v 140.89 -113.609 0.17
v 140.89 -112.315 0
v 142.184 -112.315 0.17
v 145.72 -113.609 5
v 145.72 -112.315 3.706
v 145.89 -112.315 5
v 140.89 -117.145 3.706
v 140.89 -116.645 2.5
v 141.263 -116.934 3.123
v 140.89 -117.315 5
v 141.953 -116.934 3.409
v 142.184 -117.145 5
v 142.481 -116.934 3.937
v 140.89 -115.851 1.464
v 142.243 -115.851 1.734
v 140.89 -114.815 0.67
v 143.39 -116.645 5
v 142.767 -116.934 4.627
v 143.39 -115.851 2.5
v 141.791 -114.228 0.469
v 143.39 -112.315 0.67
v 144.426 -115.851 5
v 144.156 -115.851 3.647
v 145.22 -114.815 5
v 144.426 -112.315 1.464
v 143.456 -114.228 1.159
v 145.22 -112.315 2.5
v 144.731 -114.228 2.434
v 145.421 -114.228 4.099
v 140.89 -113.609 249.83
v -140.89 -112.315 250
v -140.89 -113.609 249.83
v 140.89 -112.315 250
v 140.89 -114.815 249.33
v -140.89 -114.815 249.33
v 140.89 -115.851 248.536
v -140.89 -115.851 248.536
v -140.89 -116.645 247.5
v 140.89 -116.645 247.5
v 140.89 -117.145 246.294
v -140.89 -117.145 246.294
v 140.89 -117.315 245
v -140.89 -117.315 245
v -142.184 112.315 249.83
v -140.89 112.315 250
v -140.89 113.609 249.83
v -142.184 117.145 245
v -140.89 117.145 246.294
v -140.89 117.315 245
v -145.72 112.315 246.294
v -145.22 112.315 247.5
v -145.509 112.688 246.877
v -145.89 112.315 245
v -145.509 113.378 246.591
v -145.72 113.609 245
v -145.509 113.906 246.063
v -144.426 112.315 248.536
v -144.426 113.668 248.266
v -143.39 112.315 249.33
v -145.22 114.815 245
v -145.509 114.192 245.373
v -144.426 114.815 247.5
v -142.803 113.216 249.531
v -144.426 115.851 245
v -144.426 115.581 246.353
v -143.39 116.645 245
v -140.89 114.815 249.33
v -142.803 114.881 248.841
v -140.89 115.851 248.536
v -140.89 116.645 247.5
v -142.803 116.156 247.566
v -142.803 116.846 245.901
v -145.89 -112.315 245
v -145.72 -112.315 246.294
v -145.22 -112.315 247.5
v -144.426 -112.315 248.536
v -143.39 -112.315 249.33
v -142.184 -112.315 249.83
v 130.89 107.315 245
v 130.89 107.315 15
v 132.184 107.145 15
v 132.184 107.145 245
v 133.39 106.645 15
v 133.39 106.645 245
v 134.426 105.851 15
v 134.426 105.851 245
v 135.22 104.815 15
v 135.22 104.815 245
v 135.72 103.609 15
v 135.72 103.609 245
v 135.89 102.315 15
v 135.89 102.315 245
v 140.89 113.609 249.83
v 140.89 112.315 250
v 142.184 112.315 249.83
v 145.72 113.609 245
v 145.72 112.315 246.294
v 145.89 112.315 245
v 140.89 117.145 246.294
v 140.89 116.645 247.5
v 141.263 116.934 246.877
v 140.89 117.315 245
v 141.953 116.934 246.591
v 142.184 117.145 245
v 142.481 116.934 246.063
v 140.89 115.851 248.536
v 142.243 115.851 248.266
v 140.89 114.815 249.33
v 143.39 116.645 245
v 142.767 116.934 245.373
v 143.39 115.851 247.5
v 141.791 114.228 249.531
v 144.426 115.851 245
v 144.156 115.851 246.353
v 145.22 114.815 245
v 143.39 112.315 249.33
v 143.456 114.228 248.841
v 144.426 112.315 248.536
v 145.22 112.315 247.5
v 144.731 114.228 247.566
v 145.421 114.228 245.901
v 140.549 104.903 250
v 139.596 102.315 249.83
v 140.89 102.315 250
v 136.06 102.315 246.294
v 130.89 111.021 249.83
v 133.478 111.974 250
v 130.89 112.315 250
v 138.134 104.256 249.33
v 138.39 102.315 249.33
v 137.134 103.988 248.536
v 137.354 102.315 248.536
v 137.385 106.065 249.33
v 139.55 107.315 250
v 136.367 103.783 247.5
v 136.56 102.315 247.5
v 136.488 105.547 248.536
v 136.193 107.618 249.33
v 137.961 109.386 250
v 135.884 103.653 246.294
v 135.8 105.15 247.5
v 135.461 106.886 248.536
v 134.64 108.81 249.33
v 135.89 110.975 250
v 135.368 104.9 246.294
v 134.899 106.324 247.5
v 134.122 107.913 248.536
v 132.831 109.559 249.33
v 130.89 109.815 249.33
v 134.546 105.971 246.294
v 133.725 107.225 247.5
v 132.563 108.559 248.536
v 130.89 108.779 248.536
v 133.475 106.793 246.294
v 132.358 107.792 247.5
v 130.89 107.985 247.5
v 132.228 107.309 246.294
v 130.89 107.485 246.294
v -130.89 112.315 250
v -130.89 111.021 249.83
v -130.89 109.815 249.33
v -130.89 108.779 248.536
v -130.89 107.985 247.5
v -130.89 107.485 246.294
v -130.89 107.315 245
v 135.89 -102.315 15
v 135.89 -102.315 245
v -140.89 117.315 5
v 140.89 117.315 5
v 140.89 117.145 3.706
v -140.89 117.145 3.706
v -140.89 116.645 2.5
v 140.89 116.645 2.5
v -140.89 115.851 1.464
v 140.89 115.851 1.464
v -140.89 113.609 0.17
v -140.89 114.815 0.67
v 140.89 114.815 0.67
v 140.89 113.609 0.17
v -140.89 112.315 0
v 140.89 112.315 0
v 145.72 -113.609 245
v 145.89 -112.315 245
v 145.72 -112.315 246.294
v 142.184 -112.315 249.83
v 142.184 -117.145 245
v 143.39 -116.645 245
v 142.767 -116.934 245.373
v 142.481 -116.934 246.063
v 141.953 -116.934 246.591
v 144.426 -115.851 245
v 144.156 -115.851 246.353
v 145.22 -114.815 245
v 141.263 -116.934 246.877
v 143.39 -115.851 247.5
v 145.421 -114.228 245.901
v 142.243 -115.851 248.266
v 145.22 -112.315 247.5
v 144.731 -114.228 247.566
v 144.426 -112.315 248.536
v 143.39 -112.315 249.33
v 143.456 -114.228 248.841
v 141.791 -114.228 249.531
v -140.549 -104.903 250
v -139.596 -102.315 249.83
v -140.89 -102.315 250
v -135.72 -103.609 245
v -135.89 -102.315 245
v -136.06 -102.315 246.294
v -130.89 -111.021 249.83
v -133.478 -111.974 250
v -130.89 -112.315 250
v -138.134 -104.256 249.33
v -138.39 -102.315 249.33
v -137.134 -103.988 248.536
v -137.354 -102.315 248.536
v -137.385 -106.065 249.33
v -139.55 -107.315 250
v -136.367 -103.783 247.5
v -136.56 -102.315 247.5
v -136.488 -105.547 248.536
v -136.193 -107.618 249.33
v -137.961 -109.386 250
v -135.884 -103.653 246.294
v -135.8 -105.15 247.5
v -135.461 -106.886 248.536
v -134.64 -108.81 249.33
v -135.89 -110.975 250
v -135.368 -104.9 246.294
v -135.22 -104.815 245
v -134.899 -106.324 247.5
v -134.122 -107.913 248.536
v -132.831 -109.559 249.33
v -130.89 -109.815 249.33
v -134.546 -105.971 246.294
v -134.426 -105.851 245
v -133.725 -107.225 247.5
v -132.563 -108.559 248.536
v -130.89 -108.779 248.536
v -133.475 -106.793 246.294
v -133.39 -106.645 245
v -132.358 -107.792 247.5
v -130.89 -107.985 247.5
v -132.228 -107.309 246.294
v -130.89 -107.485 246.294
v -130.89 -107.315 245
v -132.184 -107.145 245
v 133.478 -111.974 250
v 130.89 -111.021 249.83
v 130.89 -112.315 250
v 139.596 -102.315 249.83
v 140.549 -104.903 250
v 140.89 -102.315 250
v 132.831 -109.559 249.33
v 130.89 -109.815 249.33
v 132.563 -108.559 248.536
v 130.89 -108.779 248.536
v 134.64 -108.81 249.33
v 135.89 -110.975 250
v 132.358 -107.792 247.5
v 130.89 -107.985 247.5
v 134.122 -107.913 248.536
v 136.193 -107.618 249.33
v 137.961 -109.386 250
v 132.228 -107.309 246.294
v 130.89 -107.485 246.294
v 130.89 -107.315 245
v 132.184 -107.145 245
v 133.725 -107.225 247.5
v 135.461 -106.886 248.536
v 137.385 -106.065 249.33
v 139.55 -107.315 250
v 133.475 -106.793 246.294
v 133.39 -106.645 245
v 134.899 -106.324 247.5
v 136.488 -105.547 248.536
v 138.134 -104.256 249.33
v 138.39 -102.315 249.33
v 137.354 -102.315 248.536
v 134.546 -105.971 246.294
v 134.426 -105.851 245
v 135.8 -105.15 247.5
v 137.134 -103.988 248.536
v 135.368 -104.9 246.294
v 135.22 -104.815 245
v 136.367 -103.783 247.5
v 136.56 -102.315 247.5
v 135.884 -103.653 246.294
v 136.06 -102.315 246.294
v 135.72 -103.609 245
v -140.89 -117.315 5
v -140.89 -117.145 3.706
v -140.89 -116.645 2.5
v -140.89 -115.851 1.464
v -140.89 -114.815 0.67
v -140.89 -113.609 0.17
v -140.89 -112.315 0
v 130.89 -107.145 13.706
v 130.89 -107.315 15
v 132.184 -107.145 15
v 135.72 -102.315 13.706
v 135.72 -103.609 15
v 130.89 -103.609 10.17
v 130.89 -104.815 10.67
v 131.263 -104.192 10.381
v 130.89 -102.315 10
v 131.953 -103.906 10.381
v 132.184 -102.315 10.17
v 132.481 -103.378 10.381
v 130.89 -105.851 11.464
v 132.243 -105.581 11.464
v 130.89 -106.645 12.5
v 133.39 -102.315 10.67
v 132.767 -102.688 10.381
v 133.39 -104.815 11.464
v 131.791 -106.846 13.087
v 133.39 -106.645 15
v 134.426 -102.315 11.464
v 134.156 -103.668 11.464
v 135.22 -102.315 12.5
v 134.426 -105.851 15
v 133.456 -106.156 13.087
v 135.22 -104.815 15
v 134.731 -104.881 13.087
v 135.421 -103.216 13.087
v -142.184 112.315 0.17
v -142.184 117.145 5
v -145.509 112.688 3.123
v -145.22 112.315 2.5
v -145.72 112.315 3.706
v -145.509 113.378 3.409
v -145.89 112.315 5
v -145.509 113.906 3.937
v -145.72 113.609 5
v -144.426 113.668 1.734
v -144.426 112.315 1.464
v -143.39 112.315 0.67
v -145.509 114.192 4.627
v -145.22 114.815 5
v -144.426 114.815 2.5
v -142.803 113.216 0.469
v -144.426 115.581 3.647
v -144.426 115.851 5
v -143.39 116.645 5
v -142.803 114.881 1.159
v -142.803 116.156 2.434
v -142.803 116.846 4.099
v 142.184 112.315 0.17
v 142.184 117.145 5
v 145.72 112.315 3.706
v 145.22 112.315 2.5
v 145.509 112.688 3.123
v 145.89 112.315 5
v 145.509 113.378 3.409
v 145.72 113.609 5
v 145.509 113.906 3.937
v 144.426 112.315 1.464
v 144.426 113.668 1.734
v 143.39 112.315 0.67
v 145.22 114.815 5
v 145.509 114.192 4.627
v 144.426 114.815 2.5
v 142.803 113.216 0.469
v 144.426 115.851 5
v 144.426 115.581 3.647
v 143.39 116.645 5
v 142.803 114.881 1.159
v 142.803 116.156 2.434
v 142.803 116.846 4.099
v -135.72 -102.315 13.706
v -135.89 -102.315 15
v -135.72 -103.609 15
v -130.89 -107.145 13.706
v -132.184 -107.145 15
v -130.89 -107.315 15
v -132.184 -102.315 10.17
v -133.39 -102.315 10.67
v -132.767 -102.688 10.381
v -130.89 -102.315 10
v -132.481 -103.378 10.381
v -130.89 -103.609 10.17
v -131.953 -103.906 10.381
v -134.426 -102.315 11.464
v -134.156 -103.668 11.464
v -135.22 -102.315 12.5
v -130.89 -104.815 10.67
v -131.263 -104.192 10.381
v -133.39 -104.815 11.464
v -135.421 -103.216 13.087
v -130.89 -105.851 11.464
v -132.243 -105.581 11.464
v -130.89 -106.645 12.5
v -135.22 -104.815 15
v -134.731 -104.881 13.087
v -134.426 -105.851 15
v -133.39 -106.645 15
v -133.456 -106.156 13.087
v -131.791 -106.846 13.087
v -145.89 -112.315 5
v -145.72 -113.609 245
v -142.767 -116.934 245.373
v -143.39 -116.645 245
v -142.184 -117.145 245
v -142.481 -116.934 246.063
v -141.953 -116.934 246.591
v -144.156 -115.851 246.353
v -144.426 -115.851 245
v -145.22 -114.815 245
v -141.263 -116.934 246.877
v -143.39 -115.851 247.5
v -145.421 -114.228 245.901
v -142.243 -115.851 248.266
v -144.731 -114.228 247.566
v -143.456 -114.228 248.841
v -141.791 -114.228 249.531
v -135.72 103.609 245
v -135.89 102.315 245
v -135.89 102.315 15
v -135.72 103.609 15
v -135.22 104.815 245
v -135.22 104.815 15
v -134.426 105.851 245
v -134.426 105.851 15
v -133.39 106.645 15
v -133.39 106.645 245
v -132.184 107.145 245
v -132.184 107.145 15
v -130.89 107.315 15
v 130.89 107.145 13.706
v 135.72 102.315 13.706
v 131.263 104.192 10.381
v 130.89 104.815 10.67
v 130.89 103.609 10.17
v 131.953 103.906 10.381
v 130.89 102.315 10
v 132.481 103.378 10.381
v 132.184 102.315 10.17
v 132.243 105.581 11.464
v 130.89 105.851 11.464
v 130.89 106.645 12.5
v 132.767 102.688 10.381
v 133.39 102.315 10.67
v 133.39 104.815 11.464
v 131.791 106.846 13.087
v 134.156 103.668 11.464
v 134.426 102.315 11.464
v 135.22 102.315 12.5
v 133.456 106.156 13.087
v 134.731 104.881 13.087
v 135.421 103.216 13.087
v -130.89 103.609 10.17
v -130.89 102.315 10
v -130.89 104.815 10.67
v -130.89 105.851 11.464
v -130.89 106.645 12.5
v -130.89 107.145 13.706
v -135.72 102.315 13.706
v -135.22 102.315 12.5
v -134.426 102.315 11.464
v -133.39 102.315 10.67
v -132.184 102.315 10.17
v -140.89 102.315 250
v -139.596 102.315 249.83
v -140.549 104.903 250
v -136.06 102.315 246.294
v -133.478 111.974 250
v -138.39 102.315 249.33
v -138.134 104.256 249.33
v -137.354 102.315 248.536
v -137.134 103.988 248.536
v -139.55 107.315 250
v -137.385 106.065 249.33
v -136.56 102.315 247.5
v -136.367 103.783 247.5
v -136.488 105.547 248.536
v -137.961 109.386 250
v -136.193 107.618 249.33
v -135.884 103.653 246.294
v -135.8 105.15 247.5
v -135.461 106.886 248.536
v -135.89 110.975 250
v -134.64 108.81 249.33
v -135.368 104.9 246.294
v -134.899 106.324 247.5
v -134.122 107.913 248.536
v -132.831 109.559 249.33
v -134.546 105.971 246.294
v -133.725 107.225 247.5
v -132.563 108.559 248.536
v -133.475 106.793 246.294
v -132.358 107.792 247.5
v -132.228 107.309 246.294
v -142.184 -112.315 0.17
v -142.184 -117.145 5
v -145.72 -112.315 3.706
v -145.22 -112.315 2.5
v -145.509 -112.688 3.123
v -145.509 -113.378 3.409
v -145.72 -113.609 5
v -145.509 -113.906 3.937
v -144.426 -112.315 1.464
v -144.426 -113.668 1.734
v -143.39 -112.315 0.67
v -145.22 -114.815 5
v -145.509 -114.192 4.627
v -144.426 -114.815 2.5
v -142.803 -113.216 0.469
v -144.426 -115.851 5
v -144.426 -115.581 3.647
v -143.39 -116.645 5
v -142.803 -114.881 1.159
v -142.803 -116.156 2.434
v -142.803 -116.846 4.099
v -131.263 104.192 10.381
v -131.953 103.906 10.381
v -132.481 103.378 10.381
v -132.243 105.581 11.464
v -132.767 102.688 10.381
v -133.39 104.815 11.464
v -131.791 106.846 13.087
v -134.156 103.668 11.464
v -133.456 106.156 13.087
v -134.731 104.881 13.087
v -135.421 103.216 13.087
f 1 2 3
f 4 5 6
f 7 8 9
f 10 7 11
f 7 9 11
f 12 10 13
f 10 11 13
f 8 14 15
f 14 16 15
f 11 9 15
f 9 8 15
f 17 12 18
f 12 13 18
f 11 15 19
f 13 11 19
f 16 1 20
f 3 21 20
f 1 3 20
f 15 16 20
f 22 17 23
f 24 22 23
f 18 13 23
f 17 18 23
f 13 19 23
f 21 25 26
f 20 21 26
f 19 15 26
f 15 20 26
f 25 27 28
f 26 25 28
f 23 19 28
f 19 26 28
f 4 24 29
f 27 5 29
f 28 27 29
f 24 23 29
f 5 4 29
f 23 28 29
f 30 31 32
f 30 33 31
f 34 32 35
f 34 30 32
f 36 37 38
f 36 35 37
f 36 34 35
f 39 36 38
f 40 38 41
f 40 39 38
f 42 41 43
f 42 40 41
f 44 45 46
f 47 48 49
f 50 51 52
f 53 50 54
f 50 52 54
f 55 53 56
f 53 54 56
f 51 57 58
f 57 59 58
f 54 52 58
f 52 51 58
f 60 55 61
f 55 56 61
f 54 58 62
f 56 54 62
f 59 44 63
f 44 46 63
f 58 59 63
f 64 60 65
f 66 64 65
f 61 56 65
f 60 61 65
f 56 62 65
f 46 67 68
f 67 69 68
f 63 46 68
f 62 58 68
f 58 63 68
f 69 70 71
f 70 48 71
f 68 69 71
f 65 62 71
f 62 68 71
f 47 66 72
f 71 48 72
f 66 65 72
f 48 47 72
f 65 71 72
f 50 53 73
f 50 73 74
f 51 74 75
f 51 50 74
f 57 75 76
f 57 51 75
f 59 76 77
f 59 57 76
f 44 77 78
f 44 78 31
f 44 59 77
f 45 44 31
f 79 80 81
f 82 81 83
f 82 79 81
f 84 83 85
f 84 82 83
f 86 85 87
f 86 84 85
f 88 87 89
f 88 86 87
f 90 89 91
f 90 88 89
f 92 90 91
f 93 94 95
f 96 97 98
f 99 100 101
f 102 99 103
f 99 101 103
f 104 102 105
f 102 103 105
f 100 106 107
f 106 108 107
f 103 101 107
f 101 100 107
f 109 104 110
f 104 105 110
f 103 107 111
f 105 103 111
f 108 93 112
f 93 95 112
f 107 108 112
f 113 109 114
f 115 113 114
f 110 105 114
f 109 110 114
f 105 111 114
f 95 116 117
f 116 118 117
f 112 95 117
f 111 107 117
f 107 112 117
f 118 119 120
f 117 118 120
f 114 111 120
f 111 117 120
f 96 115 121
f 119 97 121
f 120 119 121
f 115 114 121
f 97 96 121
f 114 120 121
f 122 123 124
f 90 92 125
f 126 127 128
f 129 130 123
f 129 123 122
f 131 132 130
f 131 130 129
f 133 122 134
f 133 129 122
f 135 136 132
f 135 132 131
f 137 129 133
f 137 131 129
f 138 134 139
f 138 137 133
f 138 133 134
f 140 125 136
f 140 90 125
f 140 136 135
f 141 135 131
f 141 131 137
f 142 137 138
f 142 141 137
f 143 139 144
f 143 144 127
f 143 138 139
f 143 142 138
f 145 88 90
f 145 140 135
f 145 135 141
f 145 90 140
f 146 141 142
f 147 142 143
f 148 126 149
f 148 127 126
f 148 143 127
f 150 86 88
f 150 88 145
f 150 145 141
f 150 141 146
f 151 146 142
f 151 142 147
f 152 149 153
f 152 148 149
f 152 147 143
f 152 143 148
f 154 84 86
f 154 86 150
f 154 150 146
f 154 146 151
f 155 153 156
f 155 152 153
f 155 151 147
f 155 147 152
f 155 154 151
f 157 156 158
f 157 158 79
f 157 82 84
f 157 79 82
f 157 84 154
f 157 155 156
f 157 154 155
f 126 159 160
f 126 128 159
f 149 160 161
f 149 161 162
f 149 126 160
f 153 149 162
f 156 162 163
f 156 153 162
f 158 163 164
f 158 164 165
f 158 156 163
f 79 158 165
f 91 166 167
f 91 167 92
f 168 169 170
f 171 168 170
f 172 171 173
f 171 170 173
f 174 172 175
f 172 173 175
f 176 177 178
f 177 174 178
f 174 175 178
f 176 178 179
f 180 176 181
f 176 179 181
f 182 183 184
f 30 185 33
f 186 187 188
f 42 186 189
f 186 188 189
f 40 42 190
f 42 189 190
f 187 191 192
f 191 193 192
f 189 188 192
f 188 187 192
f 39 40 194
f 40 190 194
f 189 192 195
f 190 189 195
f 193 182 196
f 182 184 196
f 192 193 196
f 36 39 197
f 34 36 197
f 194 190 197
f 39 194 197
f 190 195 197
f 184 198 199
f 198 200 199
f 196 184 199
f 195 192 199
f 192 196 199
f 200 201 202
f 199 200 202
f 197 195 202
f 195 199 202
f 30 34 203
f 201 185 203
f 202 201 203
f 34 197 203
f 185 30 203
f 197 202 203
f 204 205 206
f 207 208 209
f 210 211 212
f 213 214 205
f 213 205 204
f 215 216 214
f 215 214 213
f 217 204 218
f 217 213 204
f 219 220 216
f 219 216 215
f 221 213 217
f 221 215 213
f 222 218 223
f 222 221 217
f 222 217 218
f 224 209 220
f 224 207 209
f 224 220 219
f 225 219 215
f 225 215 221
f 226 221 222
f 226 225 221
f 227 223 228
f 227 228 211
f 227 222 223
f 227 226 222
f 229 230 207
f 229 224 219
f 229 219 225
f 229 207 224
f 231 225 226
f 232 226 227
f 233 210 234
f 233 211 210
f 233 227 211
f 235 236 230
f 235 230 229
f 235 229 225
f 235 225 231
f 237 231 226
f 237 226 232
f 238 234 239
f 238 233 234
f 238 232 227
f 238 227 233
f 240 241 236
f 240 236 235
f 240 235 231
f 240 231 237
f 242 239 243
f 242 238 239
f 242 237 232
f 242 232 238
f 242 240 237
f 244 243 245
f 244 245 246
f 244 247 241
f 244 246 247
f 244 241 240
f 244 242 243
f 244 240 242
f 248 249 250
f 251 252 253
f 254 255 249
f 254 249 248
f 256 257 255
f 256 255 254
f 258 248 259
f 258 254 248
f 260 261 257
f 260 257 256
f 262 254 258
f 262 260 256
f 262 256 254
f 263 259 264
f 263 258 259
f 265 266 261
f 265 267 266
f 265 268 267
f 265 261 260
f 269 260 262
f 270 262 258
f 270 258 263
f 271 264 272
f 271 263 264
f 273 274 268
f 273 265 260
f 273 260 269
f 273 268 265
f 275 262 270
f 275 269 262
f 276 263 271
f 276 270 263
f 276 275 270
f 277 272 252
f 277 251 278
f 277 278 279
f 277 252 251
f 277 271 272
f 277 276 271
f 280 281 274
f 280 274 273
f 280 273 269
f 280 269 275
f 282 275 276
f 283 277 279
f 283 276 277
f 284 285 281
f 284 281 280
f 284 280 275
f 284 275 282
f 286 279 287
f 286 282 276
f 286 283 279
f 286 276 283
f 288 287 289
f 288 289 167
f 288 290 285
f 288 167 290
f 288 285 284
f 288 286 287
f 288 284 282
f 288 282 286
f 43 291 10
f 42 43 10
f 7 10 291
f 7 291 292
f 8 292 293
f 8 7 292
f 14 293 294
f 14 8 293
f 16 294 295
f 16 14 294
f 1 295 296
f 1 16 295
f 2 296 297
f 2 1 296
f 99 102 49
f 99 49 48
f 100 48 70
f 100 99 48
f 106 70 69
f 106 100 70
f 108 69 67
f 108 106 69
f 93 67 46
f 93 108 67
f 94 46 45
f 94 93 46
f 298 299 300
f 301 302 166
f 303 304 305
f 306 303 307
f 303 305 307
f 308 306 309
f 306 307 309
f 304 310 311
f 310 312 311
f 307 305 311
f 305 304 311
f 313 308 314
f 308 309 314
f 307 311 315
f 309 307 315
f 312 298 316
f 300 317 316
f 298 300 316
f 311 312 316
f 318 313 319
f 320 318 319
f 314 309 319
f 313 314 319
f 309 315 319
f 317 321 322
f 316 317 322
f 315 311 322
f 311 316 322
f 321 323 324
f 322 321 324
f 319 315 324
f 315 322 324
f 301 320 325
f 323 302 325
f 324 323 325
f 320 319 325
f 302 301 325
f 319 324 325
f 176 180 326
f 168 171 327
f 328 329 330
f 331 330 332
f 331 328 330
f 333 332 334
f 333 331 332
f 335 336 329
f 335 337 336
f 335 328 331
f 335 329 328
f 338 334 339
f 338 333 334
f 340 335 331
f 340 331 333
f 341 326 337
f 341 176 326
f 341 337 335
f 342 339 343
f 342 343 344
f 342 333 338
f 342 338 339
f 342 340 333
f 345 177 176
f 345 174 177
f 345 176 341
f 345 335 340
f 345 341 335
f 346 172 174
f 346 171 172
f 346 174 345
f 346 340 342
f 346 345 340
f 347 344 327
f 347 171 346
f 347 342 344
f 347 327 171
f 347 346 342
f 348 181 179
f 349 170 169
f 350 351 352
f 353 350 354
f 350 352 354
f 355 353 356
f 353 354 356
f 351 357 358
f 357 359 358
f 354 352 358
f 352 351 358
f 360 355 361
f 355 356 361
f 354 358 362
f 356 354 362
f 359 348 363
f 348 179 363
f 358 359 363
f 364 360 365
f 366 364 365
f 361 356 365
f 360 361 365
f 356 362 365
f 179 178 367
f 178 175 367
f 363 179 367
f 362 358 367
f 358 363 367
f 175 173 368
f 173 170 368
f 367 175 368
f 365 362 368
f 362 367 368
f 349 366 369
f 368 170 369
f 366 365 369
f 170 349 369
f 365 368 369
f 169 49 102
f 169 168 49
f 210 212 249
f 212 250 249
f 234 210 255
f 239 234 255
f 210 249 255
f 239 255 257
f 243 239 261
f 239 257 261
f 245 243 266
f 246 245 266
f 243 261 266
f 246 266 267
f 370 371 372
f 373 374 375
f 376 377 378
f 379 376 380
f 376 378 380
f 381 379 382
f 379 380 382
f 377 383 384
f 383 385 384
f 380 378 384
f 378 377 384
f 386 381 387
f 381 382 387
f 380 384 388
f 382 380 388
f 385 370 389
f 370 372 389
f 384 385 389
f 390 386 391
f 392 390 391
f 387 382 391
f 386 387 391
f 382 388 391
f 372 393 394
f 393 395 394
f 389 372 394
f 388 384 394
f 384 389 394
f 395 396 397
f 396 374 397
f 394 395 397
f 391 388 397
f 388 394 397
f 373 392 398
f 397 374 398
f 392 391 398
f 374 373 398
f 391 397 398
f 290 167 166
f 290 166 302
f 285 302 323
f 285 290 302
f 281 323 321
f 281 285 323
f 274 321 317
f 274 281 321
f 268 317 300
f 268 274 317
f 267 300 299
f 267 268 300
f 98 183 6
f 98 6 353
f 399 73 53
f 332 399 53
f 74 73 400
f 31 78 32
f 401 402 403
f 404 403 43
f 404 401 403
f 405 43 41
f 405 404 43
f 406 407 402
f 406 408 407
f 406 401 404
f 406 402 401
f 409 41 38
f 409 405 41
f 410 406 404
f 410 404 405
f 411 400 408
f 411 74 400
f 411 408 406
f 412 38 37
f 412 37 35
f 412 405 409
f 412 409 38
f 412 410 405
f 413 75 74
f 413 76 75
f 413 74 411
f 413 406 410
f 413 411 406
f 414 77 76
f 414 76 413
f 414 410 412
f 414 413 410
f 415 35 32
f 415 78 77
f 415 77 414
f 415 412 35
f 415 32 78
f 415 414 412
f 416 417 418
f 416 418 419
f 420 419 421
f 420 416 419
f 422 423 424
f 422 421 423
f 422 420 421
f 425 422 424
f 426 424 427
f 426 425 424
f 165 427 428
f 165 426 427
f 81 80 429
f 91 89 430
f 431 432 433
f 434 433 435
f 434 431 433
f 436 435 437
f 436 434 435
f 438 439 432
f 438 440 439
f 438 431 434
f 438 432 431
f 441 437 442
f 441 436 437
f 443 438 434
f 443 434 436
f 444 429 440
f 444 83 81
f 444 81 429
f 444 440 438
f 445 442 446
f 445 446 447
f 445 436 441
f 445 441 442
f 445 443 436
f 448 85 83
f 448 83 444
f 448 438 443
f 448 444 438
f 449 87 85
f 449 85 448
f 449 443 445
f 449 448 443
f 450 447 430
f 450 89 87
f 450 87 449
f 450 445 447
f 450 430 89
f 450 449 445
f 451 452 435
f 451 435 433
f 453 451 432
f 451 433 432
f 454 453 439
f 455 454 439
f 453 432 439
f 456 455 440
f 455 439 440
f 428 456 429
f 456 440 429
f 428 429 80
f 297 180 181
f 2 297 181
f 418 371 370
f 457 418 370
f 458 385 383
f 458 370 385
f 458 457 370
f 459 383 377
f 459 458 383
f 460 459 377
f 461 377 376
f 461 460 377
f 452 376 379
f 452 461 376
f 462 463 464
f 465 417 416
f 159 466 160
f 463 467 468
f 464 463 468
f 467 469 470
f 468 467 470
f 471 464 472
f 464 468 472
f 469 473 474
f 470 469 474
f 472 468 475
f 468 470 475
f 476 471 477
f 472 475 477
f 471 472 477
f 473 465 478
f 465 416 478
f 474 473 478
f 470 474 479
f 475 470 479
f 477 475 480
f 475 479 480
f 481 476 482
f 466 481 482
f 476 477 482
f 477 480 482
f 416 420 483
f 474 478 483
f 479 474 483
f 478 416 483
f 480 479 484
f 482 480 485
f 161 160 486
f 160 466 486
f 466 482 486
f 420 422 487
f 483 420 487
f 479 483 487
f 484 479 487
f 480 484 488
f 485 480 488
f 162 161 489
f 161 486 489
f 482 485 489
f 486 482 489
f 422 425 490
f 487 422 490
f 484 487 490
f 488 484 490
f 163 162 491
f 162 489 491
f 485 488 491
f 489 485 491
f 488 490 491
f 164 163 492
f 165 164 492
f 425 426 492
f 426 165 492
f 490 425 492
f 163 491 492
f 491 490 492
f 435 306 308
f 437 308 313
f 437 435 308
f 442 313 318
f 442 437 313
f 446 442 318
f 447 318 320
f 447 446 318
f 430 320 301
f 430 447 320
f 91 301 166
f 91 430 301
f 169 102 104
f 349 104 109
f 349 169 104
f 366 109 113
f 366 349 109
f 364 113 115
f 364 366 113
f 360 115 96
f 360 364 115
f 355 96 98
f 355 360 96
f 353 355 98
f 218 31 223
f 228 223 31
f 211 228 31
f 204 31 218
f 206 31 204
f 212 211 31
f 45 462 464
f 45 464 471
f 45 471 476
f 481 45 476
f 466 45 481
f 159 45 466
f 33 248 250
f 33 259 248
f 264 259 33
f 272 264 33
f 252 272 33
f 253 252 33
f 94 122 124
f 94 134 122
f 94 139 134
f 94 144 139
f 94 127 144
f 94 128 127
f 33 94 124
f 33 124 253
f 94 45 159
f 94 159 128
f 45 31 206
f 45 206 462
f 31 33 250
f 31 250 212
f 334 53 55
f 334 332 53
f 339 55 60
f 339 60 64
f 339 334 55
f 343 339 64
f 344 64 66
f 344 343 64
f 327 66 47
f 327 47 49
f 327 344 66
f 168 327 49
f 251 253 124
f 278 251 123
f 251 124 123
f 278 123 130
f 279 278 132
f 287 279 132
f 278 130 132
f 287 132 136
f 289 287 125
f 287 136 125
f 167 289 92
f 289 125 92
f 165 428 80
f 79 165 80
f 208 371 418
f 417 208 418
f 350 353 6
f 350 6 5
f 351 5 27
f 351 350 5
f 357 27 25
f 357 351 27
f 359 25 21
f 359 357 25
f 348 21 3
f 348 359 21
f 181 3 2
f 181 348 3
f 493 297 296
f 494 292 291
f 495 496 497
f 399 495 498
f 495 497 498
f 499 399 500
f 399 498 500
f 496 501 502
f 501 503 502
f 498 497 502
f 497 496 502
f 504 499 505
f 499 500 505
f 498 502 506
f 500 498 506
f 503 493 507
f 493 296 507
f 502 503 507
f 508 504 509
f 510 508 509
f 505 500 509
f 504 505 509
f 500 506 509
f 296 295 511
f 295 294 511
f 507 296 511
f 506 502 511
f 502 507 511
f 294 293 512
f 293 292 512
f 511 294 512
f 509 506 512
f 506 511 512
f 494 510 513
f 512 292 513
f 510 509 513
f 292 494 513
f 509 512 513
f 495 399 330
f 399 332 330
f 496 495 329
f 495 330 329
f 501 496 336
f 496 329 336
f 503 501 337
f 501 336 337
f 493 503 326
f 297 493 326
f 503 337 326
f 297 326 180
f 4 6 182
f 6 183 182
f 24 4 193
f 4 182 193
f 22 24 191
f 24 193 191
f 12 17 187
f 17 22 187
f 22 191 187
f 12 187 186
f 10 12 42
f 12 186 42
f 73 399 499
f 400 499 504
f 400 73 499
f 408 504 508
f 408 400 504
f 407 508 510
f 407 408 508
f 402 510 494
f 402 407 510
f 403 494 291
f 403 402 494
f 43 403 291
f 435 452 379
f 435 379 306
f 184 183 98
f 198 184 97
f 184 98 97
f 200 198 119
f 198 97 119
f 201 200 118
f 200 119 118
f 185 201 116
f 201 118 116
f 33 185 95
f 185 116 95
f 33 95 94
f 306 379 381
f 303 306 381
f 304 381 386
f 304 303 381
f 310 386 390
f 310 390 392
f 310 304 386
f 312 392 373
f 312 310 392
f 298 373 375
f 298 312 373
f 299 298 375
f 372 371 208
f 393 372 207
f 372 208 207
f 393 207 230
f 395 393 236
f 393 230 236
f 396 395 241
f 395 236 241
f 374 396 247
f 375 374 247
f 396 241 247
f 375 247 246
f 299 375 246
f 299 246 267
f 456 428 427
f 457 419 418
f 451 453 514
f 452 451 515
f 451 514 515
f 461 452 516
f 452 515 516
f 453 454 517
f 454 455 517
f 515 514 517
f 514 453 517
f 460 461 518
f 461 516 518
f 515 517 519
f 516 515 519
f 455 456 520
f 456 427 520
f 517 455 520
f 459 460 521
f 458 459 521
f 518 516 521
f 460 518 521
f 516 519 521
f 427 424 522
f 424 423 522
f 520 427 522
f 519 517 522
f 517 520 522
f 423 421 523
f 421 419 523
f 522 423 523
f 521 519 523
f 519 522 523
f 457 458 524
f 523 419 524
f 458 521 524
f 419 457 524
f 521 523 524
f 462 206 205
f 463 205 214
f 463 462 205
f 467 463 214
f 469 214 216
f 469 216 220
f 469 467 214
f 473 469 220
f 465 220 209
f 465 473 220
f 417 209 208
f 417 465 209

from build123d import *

# Parameters (mm, degrees)
CROQUIS1_W              = 291.78
CROQUIS1_H              = 234.63
CROQUIS1_W_2            = 271.78
CROQUIS1_H_2            = 214.63
SALIENTE_EXTRUIR1_DEPTH = 250
CROQUIS2_W              = 291.78
CROQUIS2_H              = 234.63
SALIENTE_EXTRUIR2_DEPTH = 10
REDONDEO1_R             = 5


with BuildPart() as part:
    # Croquis1 → Saliente-Extruir1 (new body)
    with BuildSketch(Plane.XY):
        Rectangle(CROQUIS1_W, CROQUIS1_H)
        Rectangle(CROQUIS1_W_2, CROQUIS1_H_2, mode=Mode.SUBTRACT)
    extrude(amount=SALIENTE_EXTRUIR1_DEPTH)

    # Croquis2 → Saliente-Extruir2 (add)
    with BuildSketch(Plane.XY):
        Rectangle(CROQUIS2_W, CROQUIS2_H)
    extrude(amount=SALIENTE_EXTRUIR2_DEPTH)

    # Redondeo1
    redondeo1_edges = [part.edges().sort_by_distance(p)[0] for p in [
        (145.89, 0, 250),
        (-135.89, 107.315, 130),
        (-135.89, -107.315, 130),
        (135.89, -107.315, 130),
        (135.89, 107.315, 130),
        (-135.89, 0, 250),
        (0, 117.315, 250),
        (0, -107.315, 250),
        (135.89, 0, 250),
        (0, 107.315, 250),
        (0, 107.315, 10),
        (-135.89, 0, 10),
        (0, -107.315, 10),
        (135.89, 0, 10),
        (-145.89, 0, 250),
        (0, 117.315, 0),
        (145.89, 0, 0),
        (0, -117.315, 0),
        (-145.89, 0, 0),
        (-145.89, 117.315, 125),
        (145.89, 117.315, 125),
        (145.89, -117.315, 125),
        (-145.89, -117.315, 125),
        (0, -117.315, 250),
    ]]
    fillet(redondeo1_edges, radius=REDONDEO1_R - 0.0001)  # a hair under: the kernel refuses the full size


solid = part.part
